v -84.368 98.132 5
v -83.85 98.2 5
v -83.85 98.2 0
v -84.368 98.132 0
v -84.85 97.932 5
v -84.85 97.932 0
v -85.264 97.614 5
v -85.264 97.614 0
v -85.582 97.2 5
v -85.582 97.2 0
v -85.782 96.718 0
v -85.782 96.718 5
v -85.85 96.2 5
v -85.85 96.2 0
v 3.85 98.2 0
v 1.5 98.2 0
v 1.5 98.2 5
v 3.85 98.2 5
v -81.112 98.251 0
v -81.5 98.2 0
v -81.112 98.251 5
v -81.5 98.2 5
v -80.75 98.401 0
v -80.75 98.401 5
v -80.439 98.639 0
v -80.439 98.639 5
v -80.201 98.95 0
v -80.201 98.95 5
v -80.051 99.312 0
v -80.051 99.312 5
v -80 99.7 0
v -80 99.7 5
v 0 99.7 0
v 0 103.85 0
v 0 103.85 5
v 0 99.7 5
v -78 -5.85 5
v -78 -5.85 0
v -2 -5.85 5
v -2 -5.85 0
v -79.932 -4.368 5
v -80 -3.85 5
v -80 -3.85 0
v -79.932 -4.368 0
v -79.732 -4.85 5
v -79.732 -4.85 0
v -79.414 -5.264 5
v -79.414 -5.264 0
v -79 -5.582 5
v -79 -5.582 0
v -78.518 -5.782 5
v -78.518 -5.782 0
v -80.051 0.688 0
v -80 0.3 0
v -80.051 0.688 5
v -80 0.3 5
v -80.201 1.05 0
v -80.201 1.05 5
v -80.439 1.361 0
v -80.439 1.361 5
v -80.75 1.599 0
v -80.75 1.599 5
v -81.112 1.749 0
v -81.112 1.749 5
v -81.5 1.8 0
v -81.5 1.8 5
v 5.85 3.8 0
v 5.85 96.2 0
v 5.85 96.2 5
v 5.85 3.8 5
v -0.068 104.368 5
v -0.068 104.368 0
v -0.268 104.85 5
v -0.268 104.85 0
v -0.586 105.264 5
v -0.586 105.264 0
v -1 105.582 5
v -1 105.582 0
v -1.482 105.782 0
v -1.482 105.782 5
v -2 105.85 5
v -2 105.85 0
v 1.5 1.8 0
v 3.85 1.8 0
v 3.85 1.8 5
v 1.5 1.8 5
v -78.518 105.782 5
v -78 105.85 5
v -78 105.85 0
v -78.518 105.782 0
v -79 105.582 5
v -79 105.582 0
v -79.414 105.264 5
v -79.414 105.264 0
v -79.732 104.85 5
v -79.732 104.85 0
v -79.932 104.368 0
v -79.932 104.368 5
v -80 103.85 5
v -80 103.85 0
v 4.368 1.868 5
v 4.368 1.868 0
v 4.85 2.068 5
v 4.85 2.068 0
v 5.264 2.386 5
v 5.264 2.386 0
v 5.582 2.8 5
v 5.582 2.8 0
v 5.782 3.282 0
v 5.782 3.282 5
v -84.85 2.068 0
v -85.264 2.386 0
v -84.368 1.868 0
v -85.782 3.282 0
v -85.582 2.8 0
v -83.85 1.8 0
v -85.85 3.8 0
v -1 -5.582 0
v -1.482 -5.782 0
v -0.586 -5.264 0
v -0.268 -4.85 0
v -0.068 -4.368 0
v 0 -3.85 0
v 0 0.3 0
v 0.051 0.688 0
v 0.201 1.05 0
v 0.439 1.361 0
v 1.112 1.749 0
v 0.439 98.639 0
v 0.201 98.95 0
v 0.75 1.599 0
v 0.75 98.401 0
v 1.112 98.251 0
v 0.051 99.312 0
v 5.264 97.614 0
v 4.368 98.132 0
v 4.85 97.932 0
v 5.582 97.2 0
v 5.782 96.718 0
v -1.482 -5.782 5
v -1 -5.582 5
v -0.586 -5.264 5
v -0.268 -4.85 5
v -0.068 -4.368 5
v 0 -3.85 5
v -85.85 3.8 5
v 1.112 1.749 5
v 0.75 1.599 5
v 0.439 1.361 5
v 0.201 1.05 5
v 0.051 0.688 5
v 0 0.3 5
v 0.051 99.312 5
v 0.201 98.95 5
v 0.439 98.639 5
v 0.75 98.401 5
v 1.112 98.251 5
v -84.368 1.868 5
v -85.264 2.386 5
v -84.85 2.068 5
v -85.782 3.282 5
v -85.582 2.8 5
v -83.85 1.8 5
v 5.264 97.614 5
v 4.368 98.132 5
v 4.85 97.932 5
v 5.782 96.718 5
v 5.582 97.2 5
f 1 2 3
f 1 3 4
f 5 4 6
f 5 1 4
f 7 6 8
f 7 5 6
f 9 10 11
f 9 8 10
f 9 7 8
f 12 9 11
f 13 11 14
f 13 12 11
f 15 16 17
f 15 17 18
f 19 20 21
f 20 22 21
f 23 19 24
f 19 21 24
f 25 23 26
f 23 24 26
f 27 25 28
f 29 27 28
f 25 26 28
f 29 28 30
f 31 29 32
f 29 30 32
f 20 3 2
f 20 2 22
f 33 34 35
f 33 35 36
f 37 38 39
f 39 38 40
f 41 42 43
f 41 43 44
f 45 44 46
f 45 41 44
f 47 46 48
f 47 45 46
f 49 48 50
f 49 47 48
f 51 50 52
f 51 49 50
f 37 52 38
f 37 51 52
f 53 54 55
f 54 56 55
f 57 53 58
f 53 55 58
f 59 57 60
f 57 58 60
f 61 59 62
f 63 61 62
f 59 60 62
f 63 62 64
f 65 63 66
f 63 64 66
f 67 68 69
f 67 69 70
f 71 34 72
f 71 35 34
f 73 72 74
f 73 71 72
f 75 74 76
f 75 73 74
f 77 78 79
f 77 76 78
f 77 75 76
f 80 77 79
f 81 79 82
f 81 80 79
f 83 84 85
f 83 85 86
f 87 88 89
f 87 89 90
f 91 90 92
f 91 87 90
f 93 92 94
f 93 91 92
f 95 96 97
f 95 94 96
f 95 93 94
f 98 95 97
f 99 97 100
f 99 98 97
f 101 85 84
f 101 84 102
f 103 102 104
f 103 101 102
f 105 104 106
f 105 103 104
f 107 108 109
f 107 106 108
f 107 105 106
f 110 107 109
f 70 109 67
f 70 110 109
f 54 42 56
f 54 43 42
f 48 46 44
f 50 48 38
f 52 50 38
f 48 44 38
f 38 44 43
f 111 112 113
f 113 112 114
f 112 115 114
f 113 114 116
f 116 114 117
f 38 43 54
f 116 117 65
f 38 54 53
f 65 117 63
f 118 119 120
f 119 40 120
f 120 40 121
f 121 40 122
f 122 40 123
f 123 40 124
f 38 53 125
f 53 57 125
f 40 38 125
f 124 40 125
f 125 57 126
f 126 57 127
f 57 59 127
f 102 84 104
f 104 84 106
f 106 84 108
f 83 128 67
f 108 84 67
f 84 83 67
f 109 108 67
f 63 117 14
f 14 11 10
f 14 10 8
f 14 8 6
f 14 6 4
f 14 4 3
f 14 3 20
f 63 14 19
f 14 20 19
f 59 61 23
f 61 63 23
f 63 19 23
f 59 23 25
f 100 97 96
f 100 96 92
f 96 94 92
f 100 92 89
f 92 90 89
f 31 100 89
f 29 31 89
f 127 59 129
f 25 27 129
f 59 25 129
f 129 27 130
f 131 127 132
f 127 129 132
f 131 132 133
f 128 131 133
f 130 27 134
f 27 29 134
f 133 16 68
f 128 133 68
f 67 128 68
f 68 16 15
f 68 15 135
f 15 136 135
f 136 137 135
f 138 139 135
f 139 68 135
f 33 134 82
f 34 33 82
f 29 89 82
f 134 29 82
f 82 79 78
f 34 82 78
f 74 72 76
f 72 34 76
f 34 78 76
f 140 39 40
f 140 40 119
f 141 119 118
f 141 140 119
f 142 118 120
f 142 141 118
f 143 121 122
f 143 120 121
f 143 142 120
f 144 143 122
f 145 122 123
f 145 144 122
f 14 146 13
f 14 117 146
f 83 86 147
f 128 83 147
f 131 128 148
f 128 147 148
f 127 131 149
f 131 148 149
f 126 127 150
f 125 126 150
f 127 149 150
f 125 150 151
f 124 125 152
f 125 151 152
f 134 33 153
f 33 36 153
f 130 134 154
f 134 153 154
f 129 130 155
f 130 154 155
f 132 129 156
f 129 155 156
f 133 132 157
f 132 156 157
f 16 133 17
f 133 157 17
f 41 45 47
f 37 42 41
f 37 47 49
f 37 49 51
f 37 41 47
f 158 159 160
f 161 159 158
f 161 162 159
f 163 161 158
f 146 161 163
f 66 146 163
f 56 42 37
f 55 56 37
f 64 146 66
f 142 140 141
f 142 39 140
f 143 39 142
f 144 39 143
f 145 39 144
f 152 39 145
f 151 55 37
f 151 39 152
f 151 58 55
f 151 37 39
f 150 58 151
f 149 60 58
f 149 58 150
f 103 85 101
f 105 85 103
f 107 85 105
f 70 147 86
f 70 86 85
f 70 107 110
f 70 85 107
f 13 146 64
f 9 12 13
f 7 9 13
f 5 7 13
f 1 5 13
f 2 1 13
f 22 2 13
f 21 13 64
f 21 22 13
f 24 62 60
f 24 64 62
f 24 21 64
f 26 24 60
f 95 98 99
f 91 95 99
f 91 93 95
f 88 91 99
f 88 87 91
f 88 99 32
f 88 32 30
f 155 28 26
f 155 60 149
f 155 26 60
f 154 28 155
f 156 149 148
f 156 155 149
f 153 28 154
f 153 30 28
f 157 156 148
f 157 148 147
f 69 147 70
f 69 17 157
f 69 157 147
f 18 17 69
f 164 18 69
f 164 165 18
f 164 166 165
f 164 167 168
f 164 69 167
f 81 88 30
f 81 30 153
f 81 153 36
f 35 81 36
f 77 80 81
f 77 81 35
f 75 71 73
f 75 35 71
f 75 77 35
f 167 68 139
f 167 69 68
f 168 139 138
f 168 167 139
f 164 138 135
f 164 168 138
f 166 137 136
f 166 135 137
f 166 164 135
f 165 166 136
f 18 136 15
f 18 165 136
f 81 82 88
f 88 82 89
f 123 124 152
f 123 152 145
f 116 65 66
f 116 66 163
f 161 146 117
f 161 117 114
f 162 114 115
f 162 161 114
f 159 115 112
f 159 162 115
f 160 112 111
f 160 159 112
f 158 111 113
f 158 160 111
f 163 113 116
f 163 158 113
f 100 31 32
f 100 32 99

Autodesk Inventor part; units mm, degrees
ref_plane "YZ Plane" through (0, 0, 0) normal (1, 0, 0) x (0, 1, 0)
ref_plane "XZ Plane" through (0, 0, 0) normal (0, 1, 0) x (-1, 0, 0)
ref_plane "XY Plane" through (0, 0, 0) normal (0, 0, 1) x (1, 0, 0)
sketch "Skizze3" plane through (0, 0, 0) normal (0, 0, 1) x (1, 0, 0)
  line L0 (0, 0) -> (-80, 0)
  line L1 (-80, 0) -> (-80, 100)
  line L2 (-80, 100) -> (0, 100)
  line L3 (0, 100) -> (0, 0)
  line L4 (-80, 100) -> (0, 100)
  line L5 (-40, 105.85) -> (-80, 105.85)
  line L6 (-80, 105.85) -> (-80, 100)
  line L7 (-80, 50) -> (-85.85, 50)
  line L8 (-85.85, 50) -> (-85.85, 98.2)
  line L9 (-85.85, 98.2) -> (-80, 98.2)
  line L10 (-80, 98.2) -> (-80, 50)
  line L11 (-40, 105.85) -> (-40, 100)
  dimension "d4" = 100
  dimension "d5" = 80
  dimension "d6" = 5.85
  dimension "d7" = 5.85
  dimension "d8" = 1.8
extrude "Extrusion3" add sketch "Skizze3" along normal blind 5 contours L0 L1 L2 L3
extrude "Extrusion4" add sketch "Skizze3" along normal blind 5 contours L7 L8 L9 L1 | L2 L6 L5 L11
fillet "Rundung1" radius 2 2 edges at (-85.85, 98.2, 2.5) (-80, 105.85, 2.5)
mirror "Spiegeln1" about plane through (-85.85, 50, 0) normal (0, -1, 0) of "Extrusion4", "Rundung1"
mirror "Spiegeln2" about plane through (-40, 0, 0) normal (1, 0, 0) of "Extrusion4", "Rundung1", "Spiegeln1"
fillet "Rundung2" radius 1.5 4 edges at (-80, 98.2, 2.5) (-80, 1.8, 2.5) (0, 1.8, 2.5) (0, 98.2, 2.5)
equation "\"d7\" = d6"
properties part number "BT701_trajan20_21" material "Acryl"
